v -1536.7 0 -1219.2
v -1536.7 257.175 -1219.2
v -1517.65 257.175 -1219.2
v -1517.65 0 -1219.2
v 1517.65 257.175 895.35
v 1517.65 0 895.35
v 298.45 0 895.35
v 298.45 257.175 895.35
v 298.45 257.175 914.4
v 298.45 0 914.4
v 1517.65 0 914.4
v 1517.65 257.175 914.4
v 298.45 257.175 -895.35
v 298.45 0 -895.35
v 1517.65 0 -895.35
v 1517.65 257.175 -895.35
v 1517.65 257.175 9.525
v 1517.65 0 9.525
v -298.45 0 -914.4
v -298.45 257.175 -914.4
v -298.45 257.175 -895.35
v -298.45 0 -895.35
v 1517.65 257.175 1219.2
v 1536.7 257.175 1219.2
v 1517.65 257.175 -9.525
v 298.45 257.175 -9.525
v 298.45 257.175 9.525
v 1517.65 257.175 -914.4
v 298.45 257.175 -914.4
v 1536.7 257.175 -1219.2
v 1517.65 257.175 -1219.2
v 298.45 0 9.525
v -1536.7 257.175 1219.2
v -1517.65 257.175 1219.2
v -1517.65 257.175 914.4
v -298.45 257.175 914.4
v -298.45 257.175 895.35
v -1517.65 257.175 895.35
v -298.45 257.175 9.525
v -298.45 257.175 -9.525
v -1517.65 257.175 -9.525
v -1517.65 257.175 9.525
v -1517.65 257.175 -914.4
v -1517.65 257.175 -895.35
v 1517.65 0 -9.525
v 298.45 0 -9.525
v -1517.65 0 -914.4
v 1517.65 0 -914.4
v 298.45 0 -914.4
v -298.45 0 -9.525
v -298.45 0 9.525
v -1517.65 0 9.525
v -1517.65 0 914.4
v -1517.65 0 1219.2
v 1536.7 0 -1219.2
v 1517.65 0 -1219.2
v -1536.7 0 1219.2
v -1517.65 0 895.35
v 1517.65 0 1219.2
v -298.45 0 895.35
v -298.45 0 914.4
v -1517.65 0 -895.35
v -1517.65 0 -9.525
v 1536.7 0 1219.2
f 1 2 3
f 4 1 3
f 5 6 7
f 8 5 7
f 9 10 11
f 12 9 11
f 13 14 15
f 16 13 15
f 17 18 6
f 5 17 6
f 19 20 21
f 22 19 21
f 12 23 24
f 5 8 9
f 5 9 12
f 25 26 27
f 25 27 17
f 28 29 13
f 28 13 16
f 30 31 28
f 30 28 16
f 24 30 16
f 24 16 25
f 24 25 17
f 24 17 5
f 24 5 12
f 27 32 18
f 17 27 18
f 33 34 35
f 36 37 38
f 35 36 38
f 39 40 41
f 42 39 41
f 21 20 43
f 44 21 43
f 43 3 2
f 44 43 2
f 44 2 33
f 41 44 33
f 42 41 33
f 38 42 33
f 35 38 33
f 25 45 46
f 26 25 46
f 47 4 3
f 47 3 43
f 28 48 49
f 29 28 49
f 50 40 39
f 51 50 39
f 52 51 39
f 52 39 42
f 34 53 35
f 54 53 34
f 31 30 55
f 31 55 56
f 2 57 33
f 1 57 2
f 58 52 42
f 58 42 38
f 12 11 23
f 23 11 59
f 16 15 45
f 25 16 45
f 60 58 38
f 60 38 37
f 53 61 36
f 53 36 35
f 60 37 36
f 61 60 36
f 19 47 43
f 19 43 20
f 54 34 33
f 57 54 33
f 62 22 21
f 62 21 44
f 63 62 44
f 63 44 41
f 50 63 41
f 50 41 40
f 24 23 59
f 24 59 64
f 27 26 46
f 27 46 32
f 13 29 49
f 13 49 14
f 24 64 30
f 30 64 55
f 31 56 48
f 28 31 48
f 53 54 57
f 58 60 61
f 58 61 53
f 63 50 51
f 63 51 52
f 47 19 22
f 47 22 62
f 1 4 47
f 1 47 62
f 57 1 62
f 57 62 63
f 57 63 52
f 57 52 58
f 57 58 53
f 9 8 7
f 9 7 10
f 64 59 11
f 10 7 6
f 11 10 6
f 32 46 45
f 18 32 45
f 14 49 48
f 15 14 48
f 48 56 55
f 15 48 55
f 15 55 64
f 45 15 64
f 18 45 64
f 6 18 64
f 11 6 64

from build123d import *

# Parameters (mm, degrees)
BOSS_EXTRUDE1_DEPTH   = 257.175
BOSS_EXTRUDE1_2_DEPTH = 257.175


with BuildPart() as part:
    # Sketch1 → Boss-Extrude1 (new body)
    with BuildSketch(Plane(origin=(0, 0, 0), x_dir=(1, 0, 0), z_dir=(0, 1, 0))):
        Polygon((-1536.7, 1219.2), (-1517.65, 1219.2), (-1517.65, 914.4), (-298.45, 914.4), (-298.45, 895.35), (-1517.65, 895.35), (-1517.65, 9.525), (-298.45, 9.525), (-298.45, -9.525), (-1517.65, -9.525), (-1517.65, -895.35), (-298.45, -895.35), (-298.45, -914.4), (-1517.65, -914.4), (-1517.65, -1219.2), (-1536.7, -1219.2), align=None)
    extrude(amount=BOSS_EXTRUDE1_DEPTH)


with BuildPart() as body_2:
    # Sketch1 → Boss-Extrude1 2 (new body)
    with BuildSketch(Plane(origin=(0, 0, 0), x_dir=(1, 0, 0), z_dir=(0, 1, 0))):
        Polygon((298.45, -895.35), (298.45, -914.4), (1517.65, -914.4), (1517.65, -1219.2), (1536.7, -1219.2), (1536.7, 1219.2), (1517.65, 1219.2), (1517.65, 914.4), (298.45, 914.4), (298.45, 895.35), (1517.65, 895.35), (1517.65, 9.525), (298.45, 9.525), (298.45, -9.525), (1517.65, -9.525), (1517.65, -895.35), align=None)
    extrude(amount=BOSS_EXTRUDE1_2_DEPTH)


solid = Compound([part.part, body_2.part])
